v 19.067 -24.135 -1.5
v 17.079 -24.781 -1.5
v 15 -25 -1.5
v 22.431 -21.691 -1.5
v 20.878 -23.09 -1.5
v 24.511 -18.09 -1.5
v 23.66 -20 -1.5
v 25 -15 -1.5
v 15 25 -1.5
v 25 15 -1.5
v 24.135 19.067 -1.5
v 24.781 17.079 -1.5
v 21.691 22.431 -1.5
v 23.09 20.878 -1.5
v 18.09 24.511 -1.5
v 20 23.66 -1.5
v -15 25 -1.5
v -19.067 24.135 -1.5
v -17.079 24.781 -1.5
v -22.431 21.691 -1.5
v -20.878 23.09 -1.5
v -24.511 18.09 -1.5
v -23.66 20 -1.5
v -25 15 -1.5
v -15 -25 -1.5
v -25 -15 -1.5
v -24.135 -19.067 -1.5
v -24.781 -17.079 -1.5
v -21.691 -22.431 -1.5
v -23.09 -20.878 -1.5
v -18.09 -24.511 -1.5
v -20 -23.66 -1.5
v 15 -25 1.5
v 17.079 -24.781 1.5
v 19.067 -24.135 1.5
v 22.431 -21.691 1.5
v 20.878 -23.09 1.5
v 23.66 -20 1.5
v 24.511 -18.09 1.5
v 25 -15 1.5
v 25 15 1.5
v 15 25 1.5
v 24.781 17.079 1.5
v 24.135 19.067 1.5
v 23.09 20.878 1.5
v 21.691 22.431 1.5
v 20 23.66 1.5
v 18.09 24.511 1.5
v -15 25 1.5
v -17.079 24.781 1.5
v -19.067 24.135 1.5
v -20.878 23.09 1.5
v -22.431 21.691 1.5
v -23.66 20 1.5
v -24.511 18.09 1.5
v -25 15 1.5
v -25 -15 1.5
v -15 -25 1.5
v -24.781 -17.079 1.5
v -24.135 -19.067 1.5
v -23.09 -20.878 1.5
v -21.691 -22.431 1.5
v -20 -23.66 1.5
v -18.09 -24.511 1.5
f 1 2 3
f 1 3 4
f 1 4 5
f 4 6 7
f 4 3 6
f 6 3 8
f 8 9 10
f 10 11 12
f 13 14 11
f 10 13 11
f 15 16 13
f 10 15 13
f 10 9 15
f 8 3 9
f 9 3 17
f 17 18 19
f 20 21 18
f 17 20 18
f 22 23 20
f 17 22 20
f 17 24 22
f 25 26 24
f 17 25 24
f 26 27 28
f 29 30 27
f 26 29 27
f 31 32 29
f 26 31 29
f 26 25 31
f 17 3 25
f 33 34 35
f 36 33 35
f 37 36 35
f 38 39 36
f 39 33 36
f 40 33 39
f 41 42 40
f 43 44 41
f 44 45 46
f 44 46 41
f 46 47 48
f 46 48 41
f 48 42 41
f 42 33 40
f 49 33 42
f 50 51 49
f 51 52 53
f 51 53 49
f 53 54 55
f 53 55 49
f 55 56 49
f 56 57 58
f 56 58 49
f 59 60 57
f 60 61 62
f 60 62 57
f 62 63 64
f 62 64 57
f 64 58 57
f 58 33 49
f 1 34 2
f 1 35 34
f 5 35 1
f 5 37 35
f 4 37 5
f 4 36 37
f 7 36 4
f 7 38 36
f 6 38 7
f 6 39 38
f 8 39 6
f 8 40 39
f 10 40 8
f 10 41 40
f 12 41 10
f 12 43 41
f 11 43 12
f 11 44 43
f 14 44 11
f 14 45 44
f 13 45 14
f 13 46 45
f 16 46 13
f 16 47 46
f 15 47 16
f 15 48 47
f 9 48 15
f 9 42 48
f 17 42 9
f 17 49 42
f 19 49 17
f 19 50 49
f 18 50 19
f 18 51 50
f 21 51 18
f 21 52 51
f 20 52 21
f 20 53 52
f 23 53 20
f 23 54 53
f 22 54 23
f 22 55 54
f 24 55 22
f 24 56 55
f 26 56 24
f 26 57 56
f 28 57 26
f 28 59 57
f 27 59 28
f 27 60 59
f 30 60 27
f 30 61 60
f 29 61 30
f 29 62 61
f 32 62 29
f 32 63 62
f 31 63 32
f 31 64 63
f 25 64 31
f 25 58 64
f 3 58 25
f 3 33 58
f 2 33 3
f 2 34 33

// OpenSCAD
/*
 * First test for a stamp
 */
echo(version=version());

logo = "world.inv.png"; // res 200 x 197
logox = 200; 
logoy = 197; 

module roundedRect(size, radius) {  
	linear_extrude(height=size.z, center=true) {
		offset(radius) offset(-radius) {
			square([size.x, size.y], center = true);
		}
	}
}

// Base plate
// ----------
plateWidth = 50;
plateLength = 50;
plateThickNess = 3;
cornerRadius = 10;

difference() {  
	union() {
		roundedRect([plateWidth, plateLength, plateThickNess], cornerRadius);
		translate([0, 0, 3]) {
			scale([.9 * plateWidth / logox, .9 * plateWidth / logoy, .02]) {
				color("red") {
					rotate([0, 0, -90]) {
						surface(file=logo, invert=true, center=true);
					}
				}
			}
		}
	}
}
